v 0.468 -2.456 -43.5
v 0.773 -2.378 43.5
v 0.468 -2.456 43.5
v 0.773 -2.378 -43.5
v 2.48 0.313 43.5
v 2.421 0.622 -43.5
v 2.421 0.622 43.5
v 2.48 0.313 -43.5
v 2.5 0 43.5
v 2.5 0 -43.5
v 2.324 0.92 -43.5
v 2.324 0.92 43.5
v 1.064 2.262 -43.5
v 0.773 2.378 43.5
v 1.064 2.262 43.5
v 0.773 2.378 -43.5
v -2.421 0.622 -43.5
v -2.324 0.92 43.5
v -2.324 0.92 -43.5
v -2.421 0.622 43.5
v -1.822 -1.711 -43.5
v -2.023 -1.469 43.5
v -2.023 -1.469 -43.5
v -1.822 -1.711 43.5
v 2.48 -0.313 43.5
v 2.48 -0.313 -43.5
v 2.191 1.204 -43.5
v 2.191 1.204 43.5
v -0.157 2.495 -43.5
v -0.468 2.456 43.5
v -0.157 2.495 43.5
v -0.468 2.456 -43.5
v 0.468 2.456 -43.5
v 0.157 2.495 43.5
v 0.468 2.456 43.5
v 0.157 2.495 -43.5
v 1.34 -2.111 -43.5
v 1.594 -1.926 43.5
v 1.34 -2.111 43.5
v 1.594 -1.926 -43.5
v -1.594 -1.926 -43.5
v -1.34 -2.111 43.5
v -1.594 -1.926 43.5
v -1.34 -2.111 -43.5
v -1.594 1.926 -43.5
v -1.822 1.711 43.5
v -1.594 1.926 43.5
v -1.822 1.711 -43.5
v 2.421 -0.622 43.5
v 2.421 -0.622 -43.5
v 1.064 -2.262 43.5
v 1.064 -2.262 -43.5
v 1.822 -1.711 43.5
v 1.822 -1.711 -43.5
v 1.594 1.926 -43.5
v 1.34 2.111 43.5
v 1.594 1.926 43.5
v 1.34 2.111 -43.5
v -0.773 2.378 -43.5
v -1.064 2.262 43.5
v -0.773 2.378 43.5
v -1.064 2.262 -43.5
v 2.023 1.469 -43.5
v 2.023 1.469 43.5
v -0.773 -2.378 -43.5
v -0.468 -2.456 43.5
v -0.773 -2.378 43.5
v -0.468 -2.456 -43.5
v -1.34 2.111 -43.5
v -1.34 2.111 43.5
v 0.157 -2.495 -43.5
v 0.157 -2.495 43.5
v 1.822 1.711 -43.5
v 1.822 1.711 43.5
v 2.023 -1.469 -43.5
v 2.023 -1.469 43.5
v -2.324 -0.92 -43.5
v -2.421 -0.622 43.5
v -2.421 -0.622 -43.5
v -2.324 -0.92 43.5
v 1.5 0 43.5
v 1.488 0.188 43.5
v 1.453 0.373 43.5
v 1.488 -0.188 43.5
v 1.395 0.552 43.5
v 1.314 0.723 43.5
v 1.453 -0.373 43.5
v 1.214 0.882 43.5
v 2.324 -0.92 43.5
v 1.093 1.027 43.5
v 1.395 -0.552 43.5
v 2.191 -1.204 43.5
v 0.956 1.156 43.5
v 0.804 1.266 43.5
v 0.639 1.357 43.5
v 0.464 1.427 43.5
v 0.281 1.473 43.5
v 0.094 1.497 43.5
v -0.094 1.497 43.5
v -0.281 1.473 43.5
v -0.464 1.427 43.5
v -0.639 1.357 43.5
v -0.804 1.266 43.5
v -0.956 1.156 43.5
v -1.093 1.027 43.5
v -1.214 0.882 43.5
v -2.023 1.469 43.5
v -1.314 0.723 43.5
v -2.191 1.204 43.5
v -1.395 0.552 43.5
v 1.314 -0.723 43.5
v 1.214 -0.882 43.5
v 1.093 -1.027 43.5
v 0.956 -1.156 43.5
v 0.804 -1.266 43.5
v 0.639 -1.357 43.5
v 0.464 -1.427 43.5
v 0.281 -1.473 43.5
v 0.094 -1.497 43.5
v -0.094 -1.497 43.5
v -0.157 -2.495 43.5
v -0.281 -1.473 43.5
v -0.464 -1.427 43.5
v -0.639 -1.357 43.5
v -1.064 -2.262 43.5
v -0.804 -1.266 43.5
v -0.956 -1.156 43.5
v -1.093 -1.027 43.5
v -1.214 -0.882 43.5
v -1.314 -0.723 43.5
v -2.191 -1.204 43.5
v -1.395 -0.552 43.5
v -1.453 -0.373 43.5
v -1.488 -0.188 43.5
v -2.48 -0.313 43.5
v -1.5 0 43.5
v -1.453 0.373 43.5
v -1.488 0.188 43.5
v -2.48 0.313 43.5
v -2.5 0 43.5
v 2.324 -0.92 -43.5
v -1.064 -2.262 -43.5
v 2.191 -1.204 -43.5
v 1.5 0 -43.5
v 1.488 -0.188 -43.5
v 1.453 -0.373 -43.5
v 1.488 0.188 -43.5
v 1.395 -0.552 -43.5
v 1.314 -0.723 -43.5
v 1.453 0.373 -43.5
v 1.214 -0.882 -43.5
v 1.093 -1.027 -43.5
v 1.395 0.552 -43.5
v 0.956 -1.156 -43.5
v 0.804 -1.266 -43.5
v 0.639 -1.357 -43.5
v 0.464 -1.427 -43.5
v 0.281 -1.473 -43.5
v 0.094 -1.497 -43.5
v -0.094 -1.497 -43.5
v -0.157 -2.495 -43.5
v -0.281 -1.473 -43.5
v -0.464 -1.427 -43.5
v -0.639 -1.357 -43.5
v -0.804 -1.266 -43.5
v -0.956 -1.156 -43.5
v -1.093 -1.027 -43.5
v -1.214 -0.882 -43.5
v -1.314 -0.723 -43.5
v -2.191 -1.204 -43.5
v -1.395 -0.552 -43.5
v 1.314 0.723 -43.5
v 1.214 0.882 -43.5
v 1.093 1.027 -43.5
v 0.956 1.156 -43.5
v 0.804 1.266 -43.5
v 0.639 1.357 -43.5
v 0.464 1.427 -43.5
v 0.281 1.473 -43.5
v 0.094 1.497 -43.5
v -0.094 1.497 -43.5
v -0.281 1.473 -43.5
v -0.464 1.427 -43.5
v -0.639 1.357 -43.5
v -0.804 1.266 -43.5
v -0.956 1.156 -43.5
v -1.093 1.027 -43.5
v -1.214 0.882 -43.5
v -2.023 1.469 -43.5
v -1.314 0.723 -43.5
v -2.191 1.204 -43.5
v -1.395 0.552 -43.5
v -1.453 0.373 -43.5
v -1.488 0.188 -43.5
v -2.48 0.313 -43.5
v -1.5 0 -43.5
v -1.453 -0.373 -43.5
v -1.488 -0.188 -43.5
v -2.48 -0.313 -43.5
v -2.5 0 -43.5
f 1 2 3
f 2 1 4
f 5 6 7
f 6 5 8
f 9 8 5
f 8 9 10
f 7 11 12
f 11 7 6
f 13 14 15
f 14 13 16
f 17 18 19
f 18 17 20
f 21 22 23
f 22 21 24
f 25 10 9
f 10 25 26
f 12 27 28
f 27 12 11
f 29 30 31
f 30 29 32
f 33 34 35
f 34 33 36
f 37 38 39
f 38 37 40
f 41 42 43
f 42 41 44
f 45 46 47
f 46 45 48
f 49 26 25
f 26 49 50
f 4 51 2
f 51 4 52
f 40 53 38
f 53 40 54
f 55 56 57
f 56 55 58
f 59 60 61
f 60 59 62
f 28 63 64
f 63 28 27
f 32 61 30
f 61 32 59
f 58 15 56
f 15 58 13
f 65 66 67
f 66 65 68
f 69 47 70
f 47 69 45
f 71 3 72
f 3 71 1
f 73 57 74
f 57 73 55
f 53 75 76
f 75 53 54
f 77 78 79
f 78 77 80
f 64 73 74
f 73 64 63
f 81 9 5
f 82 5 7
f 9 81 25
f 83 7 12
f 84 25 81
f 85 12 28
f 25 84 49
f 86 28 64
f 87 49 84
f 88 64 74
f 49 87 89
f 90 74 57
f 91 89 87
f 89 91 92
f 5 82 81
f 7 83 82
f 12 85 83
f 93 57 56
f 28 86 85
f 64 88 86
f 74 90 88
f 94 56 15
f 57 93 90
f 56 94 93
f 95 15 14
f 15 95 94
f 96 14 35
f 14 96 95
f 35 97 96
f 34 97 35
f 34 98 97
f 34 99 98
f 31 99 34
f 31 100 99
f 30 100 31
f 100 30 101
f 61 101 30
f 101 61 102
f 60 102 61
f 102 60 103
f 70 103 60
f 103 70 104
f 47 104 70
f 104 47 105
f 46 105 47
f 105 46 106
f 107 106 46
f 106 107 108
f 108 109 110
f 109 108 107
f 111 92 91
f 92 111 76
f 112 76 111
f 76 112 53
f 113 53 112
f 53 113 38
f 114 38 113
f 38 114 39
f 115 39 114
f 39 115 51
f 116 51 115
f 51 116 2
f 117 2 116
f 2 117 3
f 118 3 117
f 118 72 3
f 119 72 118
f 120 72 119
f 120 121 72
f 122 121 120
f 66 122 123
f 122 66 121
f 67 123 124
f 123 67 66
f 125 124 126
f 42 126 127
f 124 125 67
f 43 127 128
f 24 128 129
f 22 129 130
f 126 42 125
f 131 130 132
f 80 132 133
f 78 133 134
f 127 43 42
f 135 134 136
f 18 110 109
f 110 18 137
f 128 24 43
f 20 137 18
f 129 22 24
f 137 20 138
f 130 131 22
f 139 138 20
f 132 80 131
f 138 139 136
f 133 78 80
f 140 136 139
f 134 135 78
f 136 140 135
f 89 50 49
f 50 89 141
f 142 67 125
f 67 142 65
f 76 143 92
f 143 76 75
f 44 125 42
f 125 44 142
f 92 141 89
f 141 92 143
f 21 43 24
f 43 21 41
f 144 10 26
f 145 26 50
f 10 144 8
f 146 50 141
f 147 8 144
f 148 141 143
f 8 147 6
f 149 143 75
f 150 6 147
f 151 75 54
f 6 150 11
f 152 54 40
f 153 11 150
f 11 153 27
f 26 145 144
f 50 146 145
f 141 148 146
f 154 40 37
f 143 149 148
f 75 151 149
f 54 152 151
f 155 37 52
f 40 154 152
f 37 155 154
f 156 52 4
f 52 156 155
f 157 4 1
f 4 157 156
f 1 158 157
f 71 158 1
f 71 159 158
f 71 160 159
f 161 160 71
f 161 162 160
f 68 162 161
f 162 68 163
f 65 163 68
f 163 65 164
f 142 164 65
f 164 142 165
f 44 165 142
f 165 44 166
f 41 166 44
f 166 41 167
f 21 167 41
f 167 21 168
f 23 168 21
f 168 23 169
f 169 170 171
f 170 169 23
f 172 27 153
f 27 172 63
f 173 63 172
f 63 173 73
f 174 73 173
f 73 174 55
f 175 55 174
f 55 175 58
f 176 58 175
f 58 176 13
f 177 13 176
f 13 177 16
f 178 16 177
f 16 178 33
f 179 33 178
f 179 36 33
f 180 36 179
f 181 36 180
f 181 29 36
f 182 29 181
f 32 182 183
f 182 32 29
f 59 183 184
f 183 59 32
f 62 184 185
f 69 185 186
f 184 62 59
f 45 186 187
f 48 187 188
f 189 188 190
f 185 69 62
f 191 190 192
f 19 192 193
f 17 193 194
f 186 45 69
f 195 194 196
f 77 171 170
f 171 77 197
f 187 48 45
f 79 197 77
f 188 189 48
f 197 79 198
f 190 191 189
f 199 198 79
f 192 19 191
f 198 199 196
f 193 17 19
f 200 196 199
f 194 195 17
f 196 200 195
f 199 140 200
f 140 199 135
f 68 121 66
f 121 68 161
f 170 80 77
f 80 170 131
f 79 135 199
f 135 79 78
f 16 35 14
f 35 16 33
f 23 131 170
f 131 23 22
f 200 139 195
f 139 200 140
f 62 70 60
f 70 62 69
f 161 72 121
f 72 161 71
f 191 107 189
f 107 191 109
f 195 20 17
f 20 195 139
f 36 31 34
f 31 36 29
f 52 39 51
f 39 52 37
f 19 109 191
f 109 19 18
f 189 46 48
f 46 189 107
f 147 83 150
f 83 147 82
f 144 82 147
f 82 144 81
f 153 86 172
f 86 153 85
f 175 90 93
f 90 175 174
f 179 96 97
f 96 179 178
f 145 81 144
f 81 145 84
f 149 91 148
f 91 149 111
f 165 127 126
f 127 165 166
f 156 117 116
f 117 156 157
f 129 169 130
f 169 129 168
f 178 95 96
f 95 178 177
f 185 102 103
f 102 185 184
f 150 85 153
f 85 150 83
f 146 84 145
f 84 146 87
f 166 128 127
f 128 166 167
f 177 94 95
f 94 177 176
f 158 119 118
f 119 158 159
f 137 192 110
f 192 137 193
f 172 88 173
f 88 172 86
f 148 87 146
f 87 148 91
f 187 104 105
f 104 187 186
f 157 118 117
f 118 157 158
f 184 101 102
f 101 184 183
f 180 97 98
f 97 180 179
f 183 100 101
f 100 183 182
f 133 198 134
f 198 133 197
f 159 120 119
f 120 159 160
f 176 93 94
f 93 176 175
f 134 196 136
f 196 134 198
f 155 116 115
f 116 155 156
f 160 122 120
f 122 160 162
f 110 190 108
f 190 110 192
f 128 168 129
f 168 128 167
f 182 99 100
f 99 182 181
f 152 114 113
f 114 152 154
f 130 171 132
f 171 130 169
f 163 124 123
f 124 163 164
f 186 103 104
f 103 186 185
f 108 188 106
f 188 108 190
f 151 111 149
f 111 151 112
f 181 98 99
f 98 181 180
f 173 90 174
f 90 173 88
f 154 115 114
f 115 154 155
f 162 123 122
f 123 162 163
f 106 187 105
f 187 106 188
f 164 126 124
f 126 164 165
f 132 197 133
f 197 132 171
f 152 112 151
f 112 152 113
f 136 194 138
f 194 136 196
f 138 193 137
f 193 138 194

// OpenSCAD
$fn = 50;


difference() {
	union() {
		translate(v = [0, 0, -43.5000000000]) {
			cylinder(h = 87, r = 2.5000000000);
		}
	}
	union() {
		translate(v = [0, 0, -100.0000000000]) {
			cylinder(h = 200, r = 1.5000000000);
		}
	}
}
